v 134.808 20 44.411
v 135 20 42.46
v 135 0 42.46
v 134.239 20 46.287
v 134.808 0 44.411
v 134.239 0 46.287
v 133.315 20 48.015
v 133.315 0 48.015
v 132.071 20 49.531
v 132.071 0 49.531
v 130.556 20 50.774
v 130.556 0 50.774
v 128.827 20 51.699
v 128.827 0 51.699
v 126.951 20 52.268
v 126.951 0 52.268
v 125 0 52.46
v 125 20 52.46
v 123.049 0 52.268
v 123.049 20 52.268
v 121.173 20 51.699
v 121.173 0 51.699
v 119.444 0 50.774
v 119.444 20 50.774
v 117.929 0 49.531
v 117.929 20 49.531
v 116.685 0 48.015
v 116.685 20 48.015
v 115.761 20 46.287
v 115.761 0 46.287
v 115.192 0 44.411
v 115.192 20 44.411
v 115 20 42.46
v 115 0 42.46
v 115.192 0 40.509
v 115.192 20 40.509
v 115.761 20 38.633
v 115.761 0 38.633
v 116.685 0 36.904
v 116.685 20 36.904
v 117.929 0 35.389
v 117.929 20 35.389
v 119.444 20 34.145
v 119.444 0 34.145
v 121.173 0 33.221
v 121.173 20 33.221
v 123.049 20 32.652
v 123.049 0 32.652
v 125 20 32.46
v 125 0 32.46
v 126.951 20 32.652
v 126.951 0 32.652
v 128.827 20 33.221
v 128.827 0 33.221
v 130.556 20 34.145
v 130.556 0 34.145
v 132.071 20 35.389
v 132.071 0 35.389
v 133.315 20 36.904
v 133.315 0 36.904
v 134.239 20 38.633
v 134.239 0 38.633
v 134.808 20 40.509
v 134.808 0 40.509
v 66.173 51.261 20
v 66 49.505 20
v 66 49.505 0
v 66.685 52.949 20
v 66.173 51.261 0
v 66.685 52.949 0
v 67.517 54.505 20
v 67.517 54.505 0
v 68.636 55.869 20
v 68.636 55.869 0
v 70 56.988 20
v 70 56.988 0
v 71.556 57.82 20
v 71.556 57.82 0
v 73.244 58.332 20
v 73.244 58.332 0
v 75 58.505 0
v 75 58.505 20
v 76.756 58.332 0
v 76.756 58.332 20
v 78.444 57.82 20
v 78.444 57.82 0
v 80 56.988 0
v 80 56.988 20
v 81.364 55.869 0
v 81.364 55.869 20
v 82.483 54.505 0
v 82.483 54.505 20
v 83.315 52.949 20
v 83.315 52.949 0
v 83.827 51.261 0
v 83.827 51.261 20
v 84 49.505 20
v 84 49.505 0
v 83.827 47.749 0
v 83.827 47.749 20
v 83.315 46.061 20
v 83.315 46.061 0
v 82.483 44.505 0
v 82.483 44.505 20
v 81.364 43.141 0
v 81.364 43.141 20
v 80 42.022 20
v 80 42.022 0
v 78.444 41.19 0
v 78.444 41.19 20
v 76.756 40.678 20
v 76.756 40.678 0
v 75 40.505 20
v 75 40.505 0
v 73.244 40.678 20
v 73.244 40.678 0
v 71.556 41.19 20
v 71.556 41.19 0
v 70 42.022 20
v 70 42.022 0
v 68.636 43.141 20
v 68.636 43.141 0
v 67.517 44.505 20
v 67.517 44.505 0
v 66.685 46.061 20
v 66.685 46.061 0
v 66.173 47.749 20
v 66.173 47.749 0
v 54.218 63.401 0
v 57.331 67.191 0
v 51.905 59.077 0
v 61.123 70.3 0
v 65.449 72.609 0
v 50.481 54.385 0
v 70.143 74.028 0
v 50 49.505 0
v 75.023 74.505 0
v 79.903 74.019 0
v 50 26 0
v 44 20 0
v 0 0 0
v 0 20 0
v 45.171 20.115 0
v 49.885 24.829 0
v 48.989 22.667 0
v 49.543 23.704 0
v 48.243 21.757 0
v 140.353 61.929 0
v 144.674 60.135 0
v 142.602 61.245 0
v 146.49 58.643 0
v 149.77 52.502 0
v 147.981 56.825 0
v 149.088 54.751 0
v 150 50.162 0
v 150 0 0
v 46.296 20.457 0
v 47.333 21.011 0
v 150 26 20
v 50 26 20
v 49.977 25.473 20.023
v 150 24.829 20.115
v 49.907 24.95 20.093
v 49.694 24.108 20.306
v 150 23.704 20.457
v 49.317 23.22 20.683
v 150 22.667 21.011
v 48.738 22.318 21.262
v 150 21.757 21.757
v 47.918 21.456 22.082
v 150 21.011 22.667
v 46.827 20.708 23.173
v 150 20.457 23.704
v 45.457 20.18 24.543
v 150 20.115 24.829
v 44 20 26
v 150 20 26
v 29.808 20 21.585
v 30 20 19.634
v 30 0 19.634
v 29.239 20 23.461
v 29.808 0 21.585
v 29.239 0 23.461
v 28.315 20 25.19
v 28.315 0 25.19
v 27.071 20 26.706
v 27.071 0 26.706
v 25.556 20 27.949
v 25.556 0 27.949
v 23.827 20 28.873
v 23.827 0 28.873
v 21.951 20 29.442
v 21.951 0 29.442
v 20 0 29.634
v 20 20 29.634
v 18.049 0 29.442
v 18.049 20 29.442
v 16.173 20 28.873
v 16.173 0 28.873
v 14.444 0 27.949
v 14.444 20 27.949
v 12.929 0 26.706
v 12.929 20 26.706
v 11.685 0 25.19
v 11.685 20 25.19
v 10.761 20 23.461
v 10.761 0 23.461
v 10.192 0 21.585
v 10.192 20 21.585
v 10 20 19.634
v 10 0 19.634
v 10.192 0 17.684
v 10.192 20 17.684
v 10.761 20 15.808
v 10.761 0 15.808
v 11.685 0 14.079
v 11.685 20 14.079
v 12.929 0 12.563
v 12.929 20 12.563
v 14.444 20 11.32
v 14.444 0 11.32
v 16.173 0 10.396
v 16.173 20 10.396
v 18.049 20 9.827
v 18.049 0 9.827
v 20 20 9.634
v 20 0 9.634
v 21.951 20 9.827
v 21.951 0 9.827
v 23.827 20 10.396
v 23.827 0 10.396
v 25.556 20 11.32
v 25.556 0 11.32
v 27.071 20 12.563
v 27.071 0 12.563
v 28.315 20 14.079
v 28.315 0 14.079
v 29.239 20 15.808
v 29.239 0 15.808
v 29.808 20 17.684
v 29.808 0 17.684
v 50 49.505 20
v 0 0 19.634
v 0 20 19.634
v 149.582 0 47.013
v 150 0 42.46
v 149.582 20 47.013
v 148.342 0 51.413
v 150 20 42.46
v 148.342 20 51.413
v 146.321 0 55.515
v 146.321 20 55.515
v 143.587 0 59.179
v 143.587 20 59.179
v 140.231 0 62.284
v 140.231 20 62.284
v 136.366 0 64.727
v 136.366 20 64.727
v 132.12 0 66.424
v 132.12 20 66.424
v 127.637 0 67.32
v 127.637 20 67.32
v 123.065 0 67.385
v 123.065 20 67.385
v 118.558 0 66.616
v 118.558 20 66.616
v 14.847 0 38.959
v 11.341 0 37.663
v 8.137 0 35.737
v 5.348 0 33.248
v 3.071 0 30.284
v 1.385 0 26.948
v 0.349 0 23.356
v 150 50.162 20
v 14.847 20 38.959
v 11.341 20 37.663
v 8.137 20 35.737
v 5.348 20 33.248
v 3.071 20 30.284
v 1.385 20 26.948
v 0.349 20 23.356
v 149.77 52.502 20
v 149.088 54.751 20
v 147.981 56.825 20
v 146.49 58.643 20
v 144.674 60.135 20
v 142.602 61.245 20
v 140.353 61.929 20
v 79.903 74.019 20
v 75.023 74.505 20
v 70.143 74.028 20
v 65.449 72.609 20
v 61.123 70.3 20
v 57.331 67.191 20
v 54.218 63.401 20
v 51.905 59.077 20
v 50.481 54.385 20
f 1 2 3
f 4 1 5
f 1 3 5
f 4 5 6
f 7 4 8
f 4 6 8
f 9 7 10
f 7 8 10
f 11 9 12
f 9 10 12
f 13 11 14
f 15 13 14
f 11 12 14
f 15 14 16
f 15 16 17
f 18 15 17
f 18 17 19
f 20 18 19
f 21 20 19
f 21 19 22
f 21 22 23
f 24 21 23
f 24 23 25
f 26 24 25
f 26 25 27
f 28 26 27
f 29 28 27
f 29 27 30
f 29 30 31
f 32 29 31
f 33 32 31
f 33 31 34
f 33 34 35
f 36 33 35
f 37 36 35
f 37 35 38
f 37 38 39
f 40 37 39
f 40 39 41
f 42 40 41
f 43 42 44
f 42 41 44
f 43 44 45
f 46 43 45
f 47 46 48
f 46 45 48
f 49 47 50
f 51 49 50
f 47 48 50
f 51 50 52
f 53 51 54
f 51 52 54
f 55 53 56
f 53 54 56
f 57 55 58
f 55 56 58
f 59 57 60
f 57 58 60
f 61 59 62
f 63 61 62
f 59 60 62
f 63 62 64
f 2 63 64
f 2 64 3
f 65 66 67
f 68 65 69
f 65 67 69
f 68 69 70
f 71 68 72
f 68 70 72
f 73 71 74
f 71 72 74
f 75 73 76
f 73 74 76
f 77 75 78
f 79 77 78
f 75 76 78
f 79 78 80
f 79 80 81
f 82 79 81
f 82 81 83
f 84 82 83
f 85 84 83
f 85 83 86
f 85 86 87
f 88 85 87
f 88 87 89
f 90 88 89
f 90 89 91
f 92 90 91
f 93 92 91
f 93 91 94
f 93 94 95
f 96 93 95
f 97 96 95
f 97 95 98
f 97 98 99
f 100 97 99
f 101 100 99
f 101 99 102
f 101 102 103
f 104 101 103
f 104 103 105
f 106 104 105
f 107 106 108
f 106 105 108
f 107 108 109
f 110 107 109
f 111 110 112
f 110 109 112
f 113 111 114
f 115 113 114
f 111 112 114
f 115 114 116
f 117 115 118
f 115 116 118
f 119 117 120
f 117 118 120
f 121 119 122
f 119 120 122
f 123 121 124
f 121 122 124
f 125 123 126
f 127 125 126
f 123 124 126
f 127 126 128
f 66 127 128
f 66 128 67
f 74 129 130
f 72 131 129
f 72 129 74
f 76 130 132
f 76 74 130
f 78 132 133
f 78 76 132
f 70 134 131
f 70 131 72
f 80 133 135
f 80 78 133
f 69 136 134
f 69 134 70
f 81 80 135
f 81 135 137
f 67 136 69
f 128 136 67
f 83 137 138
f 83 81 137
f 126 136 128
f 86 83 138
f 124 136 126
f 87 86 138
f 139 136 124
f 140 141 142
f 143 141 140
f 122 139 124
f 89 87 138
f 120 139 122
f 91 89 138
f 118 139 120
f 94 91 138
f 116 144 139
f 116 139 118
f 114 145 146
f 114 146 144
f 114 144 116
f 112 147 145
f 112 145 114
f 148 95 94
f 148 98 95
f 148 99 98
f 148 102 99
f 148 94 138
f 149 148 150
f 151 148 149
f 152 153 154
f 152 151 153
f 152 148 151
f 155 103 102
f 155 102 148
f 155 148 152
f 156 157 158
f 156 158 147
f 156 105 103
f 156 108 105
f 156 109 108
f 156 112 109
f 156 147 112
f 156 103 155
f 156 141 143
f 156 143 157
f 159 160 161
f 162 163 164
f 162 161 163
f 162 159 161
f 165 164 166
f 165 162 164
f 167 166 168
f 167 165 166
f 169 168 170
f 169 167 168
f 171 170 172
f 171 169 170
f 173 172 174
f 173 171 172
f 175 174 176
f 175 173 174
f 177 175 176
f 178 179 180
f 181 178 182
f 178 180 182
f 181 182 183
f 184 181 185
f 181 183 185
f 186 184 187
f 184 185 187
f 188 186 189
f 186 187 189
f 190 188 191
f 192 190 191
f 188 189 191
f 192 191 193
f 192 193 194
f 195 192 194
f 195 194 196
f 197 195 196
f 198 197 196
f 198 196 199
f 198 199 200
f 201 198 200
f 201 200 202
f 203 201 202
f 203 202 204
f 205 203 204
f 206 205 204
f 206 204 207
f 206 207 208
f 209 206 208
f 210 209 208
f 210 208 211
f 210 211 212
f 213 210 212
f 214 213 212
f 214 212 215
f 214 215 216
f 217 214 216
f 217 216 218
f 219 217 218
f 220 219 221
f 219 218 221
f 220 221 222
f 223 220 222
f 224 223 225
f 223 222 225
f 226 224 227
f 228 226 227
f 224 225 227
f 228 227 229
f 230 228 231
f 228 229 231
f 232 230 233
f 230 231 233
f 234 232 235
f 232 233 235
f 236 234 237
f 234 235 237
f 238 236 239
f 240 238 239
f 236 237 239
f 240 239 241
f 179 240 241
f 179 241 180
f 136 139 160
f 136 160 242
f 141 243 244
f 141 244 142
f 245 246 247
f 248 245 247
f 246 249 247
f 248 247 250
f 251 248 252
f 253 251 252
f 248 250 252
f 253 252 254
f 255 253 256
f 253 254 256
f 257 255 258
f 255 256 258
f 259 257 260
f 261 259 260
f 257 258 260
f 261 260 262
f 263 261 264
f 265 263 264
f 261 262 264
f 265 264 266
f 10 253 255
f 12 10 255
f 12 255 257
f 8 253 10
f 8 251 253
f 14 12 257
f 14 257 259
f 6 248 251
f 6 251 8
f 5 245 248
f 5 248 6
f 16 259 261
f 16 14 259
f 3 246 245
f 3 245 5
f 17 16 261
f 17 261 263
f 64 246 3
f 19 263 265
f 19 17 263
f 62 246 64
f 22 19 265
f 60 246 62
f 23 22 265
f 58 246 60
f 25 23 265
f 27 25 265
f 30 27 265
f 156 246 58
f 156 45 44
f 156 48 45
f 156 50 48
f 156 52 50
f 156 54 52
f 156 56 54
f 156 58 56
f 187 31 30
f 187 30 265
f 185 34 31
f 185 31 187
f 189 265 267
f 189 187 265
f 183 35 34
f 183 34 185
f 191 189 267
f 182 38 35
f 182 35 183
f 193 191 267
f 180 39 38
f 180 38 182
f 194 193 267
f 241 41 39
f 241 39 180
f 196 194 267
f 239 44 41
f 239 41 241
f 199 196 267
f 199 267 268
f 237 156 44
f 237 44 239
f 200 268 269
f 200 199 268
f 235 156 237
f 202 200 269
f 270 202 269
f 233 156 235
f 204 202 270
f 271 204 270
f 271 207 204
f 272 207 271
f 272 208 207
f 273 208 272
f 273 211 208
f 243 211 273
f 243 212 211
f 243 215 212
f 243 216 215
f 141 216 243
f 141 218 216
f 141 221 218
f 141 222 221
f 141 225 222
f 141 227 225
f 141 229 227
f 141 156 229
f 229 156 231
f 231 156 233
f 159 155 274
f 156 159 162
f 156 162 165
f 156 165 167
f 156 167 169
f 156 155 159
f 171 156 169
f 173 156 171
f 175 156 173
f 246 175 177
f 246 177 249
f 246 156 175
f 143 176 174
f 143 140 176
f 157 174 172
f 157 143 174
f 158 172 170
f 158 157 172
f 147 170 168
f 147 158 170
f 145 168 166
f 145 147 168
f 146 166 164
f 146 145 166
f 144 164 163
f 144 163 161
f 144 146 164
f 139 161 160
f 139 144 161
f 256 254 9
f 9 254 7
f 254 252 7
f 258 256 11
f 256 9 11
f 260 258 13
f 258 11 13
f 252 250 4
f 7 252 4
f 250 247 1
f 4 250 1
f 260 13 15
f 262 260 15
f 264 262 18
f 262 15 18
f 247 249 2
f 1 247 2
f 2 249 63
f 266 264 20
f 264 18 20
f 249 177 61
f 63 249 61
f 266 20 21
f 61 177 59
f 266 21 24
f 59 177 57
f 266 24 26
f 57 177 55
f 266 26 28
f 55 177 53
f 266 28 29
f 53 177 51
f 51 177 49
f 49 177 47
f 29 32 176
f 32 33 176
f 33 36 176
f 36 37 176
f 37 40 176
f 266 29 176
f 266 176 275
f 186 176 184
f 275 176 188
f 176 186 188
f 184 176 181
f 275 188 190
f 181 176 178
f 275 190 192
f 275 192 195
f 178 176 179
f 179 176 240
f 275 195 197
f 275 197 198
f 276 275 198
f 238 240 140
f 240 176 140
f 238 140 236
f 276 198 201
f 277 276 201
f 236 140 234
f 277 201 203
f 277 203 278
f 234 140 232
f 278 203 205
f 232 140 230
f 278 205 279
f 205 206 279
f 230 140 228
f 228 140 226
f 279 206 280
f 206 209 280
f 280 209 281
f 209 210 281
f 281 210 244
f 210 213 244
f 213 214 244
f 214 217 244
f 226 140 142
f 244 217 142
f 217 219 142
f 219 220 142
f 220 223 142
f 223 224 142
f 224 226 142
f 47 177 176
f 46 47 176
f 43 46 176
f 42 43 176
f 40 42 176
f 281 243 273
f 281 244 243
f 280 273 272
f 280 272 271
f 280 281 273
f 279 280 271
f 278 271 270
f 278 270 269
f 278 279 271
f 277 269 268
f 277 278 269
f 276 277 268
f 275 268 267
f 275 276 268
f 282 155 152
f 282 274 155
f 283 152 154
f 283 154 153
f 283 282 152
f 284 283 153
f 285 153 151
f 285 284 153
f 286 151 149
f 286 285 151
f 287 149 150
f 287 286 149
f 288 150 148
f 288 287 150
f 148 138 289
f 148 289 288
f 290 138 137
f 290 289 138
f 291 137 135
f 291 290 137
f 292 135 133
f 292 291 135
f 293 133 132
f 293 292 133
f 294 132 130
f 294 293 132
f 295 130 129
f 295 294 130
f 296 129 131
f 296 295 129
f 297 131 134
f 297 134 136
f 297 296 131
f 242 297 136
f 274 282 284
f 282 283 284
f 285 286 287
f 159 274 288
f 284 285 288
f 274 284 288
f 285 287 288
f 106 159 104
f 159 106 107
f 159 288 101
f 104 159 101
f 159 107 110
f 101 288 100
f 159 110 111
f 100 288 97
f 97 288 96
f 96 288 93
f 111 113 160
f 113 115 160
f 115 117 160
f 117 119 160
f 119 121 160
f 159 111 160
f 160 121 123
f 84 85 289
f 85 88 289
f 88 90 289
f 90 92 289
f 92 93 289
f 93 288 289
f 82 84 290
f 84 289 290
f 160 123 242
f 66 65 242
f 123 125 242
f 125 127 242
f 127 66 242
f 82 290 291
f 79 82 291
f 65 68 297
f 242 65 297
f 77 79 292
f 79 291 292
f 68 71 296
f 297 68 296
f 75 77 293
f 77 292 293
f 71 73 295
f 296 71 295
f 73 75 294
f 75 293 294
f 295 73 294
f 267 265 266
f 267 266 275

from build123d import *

# Parameters (mm, degrees)
EXTRUDE1_DEPTH            = 20
EXTRUDE2_DEPTH            = 20
FILLET1_R                 = 25
FILLET2_R                 = 20
FILLET3_R                 = 12
FILLET4_R                 = 6
M20_0_20_DIAMETER_HOLE1_D = 20
M18_0_18_DIAMETER_HOLE1_D = 18


with BuildPart() as part:
    # Sketch1 → Extrude1 (new body)
    with BuildSketch(Plane(origin=(0, 0, 0), x_dir=(1, 0, 0), z_dir=(0, 1, 0))):
        Polygon((0, 0), (150, 0), (150, -75), (0, -35), align=None)
    extrude(amount=EXTRUDE1_DEPTH)

    # Sketch2 → Extrude2 (add)
    with BuildSketch(Plane(origin=(0, 0, 0), x_dir=(-1, 0, 0), z_dir=(0, 0, -1))):
        Polygon((-150, 0), (-50, 0), (-50, 80), (-150, 60), align=None)
    extrude(amount=-EXTRUDE2_DEPTH)

    # Fillet1
    fillet1_edges = [part.edges().sort_by_distance(p)[0] for p in [
        (50, 80, 10),
        (150, 10, 75),
    ]]
    fillet(fillet1_edges, radius=FILLET1_R)

    # Fillet2
    fillet2_edges = [part.edges().sort_by_distance(p)[0] for p in [
        (0, 10, 35),
    ]]
    fillet(fillet2_edges, radius=FILLET2_R)

    # Fillet3
    fillet3_edges = [part.edges().sort_by_distance(p)[0] for p in [
        (150, 60, 10),
    ]]
    fillet(fillet3_edges, radius=FILLET3_R)

    # Fillet4
    fillet4_edges = [part.edges().sort_by_distance(p)[0] for p in [
        (50, 20, 10),
        (100, 20, 20),
    ]]
    fillet(fillet4_edges, radius=FILLET4_R)

    # M20.0 (20) Diameter Hole1 (through all)
    with Locations(Plane(origin=(0, 20, 0), x_dir=(-1, 0, 0), z_dir=(0, 1, 0))):
        with Locations((-125, 42.45970884), (-20, 19.634433738)):
            Hole(M20_0_20_DIAMETER_HOLE1_D / 2)

    # M18.0 (18) Diameter Hole1 (through all)
    with Locations(Plane(origin=(130.879919851, 20.264222767, 20), x_dir=(1, 0, 0), z_dir=(0, 0, 1))):
        with Locations((-55.879919851, 29.240679665)):
            Hole(M18_0_18_DIAMETER_HOLE1_D / 2)


solid = part.part
